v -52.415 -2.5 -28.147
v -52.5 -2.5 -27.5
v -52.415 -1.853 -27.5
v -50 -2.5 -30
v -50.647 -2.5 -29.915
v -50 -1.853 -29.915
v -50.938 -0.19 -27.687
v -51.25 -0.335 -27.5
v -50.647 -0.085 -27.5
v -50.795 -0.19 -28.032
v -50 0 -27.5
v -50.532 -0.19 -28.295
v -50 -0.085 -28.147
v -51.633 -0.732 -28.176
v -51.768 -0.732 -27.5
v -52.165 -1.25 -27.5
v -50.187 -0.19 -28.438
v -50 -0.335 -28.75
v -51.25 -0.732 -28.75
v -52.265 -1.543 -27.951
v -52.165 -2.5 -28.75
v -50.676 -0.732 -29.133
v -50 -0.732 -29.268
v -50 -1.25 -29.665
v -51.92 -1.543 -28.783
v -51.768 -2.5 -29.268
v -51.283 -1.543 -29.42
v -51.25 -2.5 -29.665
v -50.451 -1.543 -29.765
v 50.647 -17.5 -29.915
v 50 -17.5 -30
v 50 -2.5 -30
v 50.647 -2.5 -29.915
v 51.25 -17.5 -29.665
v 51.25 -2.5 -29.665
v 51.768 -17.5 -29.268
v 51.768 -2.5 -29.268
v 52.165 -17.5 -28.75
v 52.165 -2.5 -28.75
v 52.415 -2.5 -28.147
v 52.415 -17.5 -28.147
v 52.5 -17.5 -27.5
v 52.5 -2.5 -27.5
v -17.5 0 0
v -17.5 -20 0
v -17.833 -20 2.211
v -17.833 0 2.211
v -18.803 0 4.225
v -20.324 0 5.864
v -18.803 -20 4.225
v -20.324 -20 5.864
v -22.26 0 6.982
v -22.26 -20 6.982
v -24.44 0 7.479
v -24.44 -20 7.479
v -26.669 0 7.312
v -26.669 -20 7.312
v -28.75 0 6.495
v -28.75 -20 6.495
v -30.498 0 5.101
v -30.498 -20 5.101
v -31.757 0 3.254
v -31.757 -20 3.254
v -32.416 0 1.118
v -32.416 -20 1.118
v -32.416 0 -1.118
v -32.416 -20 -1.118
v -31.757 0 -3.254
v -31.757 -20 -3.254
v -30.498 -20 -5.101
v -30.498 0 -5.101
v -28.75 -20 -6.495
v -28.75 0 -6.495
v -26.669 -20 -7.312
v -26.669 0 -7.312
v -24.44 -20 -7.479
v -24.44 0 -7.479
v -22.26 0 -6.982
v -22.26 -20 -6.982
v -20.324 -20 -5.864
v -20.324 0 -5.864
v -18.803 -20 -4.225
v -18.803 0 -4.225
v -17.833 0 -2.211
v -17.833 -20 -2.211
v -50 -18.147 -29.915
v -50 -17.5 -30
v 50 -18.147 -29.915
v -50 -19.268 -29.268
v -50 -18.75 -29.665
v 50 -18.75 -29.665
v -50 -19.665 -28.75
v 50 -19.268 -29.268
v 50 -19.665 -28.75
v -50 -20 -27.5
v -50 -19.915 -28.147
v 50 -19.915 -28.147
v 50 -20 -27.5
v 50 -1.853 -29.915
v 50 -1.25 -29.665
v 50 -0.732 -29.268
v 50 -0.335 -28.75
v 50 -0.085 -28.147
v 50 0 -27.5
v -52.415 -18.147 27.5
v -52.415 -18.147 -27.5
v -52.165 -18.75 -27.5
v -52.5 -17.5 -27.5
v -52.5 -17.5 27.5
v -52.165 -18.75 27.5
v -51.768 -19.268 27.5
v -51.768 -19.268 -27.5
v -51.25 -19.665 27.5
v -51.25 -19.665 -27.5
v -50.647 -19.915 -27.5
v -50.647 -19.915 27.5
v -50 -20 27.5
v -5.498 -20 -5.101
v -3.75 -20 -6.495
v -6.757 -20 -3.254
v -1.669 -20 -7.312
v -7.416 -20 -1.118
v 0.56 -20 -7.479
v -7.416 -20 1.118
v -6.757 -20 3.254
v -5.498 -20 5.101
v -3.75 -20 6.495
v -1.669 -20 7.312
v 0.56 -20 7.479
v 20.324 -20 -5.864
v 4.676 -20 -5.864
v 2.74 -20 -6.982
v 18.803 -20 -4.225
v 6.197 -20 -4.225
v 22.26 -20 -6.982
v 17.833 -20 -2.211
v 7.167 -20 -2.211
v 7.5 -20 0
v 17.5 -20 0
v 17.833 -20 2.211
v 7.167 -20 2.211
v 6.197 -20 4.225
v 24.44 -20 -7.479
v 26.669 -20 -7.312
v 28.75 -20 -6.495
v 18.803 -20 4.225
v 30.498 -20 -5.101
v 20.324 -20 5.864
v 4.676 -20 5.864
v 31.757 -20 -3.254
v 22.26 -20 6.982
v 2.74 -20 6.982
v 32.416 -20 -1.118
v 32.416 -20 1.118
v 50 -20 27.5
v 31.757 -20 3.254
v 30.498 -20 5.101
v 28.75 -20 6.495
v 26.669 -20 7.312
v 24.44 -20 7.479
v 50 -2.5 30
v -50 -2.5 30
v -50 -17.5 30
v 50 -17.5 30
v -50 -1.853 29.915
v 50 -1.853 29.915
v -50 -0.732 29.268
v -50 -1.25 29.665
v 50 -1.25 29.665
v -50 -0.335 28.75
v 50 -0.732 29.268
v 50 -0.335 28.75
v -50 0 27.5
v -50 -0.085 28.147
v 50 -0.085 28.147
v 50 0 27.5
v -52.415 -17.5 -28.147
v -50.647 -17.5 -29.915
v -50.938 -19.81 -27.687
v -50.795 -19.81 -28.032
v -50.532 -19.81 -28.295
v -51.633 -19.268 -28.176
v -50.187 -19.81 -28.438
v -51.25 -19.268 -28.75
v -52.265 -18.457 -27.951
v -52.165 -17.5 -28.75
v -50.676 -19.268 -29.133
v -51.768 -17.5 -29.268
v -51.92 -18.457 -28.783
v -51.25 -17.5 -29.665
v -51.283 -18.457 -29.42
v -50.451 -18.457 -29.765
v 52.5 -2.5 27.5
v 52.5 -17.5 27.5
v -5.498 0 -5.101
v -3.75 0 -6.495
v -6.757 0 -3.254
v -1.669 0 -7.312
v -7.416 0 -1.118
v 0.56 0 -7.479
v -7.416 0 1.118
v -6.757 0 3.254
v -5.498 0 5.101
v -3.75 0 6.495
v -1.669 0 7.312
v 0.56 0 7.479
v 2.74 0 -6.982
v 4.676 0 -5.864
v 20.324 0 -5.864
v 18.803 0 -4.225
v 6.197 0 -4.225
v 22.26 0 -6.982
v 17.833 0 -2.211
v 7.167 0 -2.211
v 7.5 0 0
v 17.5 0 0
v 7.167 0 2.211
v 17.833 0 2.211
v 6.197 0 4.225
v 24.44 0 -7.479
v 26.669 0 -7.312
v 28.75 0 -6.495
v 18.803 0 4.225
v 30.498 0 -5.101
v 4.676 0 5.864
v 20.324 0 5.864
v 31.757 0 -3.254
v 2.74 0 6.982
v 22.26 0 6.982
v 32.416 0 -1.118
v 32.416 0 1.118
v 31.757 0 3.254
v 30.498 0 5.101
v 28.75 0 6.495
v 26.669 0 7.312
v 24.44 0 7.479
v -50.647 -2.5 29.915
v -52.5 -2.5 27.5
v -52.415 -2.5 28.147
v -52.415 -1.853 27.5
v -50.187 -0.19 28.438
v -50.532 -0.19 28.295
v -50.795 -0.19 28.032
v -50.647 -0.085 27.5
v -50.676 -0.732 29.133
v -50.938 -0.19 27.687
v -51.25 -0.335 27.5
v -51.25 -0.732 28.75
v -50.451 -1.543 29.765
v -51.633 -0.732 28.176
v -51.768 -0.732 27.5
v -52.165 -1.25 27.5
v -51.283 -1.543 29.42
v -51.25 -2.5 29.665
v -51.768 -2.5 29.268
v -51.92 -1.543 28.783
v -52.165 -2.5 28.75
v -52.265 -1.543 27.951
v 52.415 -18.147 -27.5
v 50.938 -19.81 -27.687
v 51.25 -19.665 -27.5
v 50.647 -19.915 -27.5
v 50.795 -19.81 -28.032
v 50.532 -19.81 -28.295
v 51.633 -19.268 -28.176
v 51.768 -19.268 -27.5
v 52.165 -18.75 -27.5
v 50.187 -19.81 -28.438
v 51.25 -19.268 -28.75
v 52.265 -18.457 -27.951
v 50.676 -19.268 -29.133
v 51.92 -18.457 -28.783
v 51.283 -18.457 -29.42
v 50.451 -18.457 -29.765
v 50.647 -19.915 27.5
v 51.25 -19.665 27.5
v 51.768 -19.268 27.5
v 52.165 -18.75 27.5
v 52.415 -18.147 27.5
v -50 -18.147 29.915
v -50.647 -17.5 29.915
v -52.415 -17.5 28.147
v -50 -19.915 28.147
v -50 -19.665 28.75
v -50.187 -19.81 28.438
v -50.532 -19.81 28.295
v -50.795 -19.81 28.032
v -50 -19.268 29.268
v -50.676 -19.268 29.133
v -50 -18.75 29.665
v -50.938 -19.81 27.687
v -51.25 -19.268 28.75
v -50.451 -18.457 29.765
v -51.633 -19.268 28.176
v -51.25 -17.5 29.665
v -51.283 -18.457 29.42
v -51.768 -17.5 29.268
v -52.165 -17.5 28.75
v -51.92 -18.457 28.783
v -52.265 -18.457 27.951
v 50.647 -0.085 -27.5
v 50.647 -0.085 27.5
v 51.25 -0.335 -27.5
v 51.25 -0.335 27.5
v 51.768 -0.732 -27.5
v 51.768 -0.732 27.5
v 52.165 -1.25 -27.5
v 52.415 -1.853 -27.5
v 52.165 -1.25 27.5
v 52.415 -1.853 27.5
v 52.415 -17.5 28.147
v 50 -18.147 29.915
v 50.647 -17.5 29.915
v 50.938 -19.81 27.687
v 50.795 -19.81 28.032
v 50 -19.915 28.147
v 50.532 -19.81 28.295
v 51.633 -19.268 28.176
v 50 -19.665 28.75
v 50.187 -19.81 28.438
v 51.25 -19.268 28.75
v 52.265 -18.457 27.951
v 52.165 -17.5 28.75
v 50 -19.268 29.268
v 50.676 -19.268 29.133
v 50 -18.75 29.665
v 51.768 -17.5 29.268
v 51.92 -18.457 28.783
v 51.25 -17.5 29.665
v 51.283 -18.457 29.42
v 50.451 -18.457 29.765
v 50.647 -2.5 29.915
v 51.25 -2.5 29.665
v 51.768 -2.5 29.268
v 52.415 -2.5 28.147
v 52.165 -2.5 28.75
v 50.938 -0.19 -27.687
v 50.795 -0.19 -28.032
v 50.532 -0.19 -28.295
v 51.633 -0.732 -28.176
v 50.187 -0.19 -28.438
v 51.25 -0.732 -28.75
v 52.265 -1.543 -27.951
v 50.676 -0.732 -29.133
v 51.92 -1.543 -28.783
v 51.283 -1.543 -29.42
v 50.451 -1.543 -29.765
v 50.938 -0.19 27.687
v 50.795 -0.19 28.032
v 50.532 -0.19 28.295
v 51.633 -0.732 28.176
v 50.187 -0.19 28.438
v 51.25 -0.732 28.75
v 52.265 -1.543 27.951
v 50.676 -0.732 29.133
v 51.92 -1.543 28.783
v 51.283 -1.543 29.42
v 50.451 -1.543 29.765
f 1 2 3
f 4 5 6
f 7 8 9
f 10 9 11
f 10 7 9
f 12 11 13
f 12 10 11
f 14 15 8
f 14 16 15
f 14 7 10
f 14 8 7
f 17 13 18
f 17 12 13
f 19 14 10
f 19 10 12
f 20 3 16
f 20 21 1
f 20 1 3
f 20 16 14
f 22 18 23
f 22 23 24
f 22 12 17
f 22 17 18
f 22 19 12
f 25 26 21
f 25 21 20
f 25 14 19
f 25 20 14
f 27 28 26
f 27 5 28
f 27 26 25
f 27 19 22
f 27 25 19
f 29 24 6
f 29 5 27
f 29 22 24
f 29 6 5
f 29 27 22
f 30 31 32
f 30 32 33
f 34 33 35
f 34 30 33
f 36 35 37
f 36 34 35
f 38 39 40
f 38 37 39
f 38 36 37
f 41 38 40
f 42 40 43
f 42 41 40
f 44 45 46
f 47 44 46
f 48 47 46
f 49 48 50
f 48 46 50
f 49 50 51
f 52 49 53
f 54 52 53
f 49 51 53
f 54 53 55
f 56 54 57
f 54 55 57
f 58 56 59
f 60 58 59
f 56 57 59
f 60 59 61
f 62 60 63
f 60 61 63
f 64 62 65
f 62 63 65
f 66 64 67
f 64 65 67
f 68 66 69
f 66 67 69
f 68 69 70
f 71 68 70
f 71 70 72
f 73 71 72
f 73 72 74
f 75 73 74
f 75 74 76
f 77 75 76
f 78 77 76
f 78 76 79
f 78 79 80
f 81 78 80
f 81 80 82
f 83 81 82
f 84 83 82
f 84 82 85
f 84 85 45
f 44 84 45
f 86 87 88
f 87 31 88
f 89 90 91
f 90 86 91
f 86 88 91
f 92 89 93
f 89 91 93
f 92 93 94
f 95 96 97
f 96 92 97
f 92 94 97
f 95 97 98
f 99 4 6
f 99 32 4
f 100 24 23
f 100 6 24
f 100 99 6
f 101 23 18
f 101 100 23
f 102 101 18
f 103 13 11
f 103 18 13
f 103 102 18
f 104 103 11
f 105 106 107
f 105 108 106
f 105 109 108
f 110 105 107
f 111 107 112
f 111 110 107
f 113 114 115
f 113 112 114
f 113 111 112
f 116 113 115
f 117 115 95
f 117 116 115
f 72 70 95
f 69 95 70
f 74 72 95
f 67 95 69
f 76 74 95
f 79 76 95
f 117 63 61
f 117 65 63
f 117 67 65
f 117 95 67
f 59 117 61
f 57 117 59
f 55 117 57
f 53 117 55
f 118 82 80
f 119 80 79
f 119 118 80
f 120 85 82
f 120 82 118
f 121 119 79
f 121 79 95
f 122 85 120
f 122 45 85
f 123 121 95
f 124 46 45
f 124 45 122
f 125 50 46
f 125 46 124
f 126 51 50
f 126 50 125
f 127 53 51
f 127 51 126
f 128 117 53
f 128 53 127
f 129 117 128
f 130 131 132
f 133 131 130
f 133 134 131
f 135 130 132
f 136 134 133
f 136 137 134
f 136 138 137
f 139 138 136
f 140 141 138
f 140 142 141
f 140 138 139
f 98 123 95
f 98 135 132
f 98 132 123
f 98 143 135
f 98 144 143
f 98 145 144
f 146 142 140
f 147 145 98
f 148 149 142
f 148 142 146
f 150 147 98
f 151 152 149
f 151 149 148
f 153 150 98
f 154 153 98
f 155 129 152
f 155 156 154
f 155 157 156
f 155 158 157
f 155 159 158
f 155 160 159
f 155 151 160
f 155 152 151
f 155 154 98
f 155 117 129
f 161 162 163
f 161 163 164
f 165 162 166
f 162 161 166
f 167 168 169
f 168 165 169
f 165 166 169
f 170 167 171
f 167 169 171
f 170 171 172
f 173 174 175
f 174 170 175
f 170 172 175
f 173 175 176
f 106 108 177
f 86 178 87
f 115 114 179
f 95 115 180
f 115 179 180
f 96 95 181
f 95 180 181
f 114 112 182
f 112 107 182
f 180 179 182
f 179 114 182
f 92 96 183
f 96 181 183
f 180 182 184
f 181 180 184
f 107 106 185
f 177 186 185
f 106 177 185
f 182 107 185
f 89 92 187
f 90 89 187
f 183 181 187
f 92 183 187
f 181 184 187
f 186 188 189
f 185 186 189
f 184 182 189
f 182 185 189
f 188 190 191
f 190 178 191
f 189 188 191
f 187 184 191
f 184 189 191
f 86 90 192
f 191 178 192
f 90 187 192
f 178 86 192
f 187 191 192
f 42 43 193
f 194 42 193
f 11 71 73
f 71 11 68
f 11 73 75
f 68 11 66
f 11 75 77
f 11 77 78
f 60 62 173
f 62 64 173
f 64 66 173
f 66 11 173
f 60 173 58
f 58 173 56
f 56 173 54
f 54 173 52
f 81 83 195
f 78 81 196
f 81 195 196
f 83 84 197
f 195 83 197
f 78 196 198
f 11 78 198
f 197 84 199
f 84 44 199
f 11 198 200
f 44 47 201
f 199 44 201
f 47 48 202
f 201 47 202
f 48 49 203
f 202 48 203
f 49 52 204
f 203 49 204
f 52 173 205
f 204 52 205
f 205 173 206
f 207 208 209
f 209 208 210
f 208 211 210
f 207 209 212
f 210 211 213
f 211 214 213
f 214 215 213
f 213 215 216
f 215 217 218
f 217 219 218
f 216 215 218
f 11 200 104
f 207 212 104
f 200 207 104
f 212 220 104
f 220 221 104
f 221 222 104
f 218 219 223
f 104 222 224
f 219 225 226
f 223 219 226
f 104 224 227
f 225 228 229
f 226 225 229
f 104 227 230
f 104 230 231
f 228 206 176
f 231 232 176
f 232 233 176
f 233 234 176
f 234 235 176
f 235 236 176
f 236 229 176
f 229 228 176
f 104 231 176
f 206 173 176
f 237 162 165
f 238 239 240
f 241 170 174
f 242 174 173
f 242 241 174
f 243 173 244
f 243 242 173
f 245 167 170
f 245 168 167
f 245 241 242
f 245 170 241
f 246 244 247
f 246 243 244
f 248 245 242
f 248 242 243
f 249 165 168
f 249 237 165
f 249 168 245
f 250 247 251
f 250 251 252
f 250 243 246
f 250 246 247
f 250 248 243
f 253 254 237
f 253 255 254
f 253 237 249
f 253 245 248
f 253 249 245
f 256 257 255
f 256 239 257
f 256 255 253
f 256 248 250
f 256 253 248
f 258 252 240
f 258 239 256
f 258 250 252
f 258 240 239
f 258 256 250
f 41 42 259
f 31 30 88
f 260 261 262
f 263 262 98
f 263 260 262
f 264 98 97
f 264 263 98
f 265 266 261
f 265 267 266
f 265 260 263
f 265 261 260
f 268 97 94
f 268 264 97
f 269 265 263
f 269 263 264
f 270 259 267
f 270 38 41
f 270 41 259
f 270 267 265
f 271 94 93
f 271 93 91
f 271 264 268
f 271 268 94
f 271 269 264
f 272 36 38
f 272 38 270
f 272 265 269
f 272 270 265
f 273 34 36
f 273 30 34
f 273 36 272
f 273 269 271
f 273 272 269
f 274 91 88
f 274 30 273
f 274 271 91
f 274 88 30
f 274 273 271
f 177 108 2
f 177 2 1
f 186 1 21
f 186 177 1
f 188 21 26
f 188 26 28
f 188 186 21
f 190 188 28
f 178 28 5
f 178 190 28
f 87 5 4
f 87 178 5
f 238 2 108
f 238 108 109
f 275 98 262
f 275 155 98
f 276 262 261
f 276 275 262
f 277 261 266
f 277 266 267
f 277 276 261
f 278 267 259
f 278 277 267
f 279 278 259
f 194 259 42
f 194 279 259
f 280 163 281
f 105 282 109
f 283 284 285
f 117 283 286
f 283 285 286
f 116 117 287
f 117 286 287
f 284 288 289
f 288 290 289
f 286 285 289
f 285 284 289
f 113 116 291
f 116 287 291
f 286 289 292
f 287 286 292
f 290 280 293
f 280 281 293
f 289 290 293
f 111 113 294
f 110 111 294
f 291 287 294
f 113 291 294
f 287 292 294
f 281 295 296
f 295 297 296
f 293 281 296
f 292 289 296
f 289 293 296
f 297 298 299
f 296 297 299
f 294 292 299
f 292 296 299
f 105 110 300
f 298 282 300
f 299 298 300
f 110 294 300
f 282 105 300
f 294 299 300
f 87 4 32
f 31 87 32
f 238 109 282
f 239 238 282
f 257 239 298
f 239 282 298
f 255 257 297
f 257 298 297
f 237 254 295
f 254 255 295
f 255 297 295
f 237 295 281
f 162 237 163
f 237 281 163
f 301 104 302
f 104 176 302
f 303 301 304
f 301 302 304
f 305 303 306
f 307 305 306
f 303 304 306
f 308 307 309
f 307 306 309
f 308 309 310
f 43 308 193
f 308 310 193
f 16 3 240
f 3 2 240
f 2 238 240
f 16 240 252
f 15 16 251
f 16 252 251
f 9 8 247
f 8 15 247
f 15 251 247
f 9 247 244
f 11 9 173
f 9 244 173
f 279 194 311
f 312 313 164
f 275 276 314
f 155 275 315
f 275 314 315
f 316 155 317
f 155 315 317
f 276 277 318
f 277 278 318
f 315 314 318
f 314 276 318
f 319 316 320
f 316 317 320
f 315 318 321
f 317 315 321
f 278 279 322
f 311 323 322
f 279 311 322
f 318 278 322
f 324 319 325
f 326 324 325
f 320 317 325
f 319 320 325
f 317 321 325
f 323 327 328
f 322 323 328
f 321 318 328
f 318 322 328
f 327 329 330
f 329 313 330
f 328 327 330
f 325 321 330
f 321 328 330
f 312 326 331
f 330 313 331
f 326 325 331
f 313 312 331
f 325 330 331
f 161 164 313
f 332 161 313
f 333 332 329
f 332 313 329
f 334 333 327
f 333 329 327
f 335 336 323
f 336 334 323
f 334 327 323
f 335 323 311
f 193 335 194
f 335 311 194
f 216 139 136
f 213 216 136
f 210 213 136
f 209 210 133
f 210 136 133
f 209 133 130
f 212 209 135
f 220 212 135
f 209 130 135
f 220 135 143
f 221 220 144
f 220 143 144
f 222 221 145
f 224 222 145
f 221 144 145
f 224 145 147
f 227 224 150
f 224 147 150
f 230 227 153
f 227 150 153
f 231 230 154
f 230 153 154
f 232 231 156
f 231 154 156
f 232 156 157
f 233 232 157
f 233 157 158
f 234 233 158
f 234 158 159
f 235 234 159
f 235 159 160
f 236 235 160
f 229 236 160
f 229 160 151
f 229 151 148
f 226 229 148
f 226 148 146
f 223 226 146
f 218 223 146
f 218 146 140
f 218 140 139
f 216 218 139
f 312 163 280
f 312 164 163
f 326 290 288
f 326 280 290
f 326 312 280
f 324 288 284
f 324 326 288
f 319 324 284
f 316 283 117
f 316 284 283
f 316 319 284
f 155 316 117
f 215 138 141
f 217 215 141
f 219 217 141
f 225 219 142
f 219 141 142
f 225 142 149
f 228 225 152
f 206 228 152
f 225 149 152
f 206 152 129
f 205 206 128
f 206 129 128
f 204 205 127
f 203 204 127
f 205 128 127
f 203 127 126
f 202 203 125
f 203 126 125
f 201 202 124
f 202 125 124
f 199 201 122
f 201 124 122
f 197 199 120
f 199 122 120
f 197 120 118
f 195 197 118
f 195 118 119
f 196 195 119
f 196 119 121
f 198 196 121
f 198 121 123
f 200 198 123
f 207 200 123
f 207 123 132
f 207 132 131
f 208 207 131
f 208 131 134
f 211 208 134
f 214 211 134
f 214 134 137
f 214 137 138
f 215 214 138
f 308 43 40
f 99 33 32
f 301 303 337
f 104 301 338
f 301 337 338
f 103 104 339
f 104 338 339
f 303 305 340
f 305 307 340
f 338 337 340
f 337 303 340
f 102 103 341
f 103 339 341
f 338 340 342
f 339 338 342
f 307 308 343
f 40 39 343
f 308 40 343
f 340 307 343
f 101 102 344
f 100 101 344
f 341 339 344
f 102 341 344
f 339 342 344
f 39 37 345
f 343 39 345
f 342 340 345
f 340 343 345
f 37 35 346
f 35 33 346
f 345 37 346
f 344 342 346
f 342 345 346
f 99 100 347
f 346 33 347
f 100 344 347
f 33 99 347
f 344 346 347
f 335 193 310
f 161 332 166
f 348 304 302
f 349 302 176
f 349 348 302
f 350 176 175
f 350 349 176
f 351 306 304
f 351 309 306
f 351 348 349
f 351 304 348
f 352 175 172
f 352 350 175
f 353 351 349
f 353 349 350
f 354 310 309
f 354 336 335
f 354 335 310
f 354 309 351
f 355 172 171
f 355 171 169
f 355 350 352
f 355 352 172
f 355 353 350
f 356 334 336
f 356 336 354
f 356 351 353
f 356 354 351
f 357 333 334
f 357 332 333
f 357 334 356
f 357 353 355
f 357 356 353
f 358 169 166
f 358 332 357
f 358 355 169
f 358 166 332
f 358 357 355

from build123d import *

# Parameters (mm, degrees)
F0_W     = 105
F0_H     = 60
F1_DEPTH = 20
F2_R     = 7.5
F3_DEPTH = 25
F4_R     = 2.5


with BuildPart() as f1:
    # F0 (on Front) → F1 (new body)
    with BuildSketch(Plane.XZ):
        Rectangle(F0_W, F0_H)
    extrude(amount=F1_DEPTH)

    # F2 (on face) → F3 (cut)
    with BuildSketch(Plane.XZ.offset(20)):
        with BuildLine():
            ThreePointArc((-7.5, 0), (0, -7.5), (7.5, 0))
            ThreePointArc((7.5, 0), (0, 7.5), (-7.5, 0))
        make_face()
        with Locations((-25, 0)):
            Circle(F2_R)
        with BuildLine():
            ThreePointArc((32.5, 0), (25, 7.5), (17.5, 0))
            ThreePointArc((17.5, 0), (25, -7.5), (32.5, 0))
        make_face()
    extrude(amount=-F3_DEPTH, mode=Mode.SUBTRACT)

    # F4
    f4_edges = [f1.edges().sort_by_distance(p)[0] for p in [
        (52.5, -10, -30),
        (52.5, -10, 30),
        (52.5, 0, 0),
        (52.5, -20, 0),
        (-52.5, -10, 30),
        (0, 0, 30),
        (0, -20, 30),
        (-52.5, -10, -30),
        (-52.5, 0, 0),
        (-52.5, -20, 0),
        (0, 0, -30),
        (0, -20, -30),
    ]]
    fillet(f4_edges, radius=F4_R)


solid = f1.part
